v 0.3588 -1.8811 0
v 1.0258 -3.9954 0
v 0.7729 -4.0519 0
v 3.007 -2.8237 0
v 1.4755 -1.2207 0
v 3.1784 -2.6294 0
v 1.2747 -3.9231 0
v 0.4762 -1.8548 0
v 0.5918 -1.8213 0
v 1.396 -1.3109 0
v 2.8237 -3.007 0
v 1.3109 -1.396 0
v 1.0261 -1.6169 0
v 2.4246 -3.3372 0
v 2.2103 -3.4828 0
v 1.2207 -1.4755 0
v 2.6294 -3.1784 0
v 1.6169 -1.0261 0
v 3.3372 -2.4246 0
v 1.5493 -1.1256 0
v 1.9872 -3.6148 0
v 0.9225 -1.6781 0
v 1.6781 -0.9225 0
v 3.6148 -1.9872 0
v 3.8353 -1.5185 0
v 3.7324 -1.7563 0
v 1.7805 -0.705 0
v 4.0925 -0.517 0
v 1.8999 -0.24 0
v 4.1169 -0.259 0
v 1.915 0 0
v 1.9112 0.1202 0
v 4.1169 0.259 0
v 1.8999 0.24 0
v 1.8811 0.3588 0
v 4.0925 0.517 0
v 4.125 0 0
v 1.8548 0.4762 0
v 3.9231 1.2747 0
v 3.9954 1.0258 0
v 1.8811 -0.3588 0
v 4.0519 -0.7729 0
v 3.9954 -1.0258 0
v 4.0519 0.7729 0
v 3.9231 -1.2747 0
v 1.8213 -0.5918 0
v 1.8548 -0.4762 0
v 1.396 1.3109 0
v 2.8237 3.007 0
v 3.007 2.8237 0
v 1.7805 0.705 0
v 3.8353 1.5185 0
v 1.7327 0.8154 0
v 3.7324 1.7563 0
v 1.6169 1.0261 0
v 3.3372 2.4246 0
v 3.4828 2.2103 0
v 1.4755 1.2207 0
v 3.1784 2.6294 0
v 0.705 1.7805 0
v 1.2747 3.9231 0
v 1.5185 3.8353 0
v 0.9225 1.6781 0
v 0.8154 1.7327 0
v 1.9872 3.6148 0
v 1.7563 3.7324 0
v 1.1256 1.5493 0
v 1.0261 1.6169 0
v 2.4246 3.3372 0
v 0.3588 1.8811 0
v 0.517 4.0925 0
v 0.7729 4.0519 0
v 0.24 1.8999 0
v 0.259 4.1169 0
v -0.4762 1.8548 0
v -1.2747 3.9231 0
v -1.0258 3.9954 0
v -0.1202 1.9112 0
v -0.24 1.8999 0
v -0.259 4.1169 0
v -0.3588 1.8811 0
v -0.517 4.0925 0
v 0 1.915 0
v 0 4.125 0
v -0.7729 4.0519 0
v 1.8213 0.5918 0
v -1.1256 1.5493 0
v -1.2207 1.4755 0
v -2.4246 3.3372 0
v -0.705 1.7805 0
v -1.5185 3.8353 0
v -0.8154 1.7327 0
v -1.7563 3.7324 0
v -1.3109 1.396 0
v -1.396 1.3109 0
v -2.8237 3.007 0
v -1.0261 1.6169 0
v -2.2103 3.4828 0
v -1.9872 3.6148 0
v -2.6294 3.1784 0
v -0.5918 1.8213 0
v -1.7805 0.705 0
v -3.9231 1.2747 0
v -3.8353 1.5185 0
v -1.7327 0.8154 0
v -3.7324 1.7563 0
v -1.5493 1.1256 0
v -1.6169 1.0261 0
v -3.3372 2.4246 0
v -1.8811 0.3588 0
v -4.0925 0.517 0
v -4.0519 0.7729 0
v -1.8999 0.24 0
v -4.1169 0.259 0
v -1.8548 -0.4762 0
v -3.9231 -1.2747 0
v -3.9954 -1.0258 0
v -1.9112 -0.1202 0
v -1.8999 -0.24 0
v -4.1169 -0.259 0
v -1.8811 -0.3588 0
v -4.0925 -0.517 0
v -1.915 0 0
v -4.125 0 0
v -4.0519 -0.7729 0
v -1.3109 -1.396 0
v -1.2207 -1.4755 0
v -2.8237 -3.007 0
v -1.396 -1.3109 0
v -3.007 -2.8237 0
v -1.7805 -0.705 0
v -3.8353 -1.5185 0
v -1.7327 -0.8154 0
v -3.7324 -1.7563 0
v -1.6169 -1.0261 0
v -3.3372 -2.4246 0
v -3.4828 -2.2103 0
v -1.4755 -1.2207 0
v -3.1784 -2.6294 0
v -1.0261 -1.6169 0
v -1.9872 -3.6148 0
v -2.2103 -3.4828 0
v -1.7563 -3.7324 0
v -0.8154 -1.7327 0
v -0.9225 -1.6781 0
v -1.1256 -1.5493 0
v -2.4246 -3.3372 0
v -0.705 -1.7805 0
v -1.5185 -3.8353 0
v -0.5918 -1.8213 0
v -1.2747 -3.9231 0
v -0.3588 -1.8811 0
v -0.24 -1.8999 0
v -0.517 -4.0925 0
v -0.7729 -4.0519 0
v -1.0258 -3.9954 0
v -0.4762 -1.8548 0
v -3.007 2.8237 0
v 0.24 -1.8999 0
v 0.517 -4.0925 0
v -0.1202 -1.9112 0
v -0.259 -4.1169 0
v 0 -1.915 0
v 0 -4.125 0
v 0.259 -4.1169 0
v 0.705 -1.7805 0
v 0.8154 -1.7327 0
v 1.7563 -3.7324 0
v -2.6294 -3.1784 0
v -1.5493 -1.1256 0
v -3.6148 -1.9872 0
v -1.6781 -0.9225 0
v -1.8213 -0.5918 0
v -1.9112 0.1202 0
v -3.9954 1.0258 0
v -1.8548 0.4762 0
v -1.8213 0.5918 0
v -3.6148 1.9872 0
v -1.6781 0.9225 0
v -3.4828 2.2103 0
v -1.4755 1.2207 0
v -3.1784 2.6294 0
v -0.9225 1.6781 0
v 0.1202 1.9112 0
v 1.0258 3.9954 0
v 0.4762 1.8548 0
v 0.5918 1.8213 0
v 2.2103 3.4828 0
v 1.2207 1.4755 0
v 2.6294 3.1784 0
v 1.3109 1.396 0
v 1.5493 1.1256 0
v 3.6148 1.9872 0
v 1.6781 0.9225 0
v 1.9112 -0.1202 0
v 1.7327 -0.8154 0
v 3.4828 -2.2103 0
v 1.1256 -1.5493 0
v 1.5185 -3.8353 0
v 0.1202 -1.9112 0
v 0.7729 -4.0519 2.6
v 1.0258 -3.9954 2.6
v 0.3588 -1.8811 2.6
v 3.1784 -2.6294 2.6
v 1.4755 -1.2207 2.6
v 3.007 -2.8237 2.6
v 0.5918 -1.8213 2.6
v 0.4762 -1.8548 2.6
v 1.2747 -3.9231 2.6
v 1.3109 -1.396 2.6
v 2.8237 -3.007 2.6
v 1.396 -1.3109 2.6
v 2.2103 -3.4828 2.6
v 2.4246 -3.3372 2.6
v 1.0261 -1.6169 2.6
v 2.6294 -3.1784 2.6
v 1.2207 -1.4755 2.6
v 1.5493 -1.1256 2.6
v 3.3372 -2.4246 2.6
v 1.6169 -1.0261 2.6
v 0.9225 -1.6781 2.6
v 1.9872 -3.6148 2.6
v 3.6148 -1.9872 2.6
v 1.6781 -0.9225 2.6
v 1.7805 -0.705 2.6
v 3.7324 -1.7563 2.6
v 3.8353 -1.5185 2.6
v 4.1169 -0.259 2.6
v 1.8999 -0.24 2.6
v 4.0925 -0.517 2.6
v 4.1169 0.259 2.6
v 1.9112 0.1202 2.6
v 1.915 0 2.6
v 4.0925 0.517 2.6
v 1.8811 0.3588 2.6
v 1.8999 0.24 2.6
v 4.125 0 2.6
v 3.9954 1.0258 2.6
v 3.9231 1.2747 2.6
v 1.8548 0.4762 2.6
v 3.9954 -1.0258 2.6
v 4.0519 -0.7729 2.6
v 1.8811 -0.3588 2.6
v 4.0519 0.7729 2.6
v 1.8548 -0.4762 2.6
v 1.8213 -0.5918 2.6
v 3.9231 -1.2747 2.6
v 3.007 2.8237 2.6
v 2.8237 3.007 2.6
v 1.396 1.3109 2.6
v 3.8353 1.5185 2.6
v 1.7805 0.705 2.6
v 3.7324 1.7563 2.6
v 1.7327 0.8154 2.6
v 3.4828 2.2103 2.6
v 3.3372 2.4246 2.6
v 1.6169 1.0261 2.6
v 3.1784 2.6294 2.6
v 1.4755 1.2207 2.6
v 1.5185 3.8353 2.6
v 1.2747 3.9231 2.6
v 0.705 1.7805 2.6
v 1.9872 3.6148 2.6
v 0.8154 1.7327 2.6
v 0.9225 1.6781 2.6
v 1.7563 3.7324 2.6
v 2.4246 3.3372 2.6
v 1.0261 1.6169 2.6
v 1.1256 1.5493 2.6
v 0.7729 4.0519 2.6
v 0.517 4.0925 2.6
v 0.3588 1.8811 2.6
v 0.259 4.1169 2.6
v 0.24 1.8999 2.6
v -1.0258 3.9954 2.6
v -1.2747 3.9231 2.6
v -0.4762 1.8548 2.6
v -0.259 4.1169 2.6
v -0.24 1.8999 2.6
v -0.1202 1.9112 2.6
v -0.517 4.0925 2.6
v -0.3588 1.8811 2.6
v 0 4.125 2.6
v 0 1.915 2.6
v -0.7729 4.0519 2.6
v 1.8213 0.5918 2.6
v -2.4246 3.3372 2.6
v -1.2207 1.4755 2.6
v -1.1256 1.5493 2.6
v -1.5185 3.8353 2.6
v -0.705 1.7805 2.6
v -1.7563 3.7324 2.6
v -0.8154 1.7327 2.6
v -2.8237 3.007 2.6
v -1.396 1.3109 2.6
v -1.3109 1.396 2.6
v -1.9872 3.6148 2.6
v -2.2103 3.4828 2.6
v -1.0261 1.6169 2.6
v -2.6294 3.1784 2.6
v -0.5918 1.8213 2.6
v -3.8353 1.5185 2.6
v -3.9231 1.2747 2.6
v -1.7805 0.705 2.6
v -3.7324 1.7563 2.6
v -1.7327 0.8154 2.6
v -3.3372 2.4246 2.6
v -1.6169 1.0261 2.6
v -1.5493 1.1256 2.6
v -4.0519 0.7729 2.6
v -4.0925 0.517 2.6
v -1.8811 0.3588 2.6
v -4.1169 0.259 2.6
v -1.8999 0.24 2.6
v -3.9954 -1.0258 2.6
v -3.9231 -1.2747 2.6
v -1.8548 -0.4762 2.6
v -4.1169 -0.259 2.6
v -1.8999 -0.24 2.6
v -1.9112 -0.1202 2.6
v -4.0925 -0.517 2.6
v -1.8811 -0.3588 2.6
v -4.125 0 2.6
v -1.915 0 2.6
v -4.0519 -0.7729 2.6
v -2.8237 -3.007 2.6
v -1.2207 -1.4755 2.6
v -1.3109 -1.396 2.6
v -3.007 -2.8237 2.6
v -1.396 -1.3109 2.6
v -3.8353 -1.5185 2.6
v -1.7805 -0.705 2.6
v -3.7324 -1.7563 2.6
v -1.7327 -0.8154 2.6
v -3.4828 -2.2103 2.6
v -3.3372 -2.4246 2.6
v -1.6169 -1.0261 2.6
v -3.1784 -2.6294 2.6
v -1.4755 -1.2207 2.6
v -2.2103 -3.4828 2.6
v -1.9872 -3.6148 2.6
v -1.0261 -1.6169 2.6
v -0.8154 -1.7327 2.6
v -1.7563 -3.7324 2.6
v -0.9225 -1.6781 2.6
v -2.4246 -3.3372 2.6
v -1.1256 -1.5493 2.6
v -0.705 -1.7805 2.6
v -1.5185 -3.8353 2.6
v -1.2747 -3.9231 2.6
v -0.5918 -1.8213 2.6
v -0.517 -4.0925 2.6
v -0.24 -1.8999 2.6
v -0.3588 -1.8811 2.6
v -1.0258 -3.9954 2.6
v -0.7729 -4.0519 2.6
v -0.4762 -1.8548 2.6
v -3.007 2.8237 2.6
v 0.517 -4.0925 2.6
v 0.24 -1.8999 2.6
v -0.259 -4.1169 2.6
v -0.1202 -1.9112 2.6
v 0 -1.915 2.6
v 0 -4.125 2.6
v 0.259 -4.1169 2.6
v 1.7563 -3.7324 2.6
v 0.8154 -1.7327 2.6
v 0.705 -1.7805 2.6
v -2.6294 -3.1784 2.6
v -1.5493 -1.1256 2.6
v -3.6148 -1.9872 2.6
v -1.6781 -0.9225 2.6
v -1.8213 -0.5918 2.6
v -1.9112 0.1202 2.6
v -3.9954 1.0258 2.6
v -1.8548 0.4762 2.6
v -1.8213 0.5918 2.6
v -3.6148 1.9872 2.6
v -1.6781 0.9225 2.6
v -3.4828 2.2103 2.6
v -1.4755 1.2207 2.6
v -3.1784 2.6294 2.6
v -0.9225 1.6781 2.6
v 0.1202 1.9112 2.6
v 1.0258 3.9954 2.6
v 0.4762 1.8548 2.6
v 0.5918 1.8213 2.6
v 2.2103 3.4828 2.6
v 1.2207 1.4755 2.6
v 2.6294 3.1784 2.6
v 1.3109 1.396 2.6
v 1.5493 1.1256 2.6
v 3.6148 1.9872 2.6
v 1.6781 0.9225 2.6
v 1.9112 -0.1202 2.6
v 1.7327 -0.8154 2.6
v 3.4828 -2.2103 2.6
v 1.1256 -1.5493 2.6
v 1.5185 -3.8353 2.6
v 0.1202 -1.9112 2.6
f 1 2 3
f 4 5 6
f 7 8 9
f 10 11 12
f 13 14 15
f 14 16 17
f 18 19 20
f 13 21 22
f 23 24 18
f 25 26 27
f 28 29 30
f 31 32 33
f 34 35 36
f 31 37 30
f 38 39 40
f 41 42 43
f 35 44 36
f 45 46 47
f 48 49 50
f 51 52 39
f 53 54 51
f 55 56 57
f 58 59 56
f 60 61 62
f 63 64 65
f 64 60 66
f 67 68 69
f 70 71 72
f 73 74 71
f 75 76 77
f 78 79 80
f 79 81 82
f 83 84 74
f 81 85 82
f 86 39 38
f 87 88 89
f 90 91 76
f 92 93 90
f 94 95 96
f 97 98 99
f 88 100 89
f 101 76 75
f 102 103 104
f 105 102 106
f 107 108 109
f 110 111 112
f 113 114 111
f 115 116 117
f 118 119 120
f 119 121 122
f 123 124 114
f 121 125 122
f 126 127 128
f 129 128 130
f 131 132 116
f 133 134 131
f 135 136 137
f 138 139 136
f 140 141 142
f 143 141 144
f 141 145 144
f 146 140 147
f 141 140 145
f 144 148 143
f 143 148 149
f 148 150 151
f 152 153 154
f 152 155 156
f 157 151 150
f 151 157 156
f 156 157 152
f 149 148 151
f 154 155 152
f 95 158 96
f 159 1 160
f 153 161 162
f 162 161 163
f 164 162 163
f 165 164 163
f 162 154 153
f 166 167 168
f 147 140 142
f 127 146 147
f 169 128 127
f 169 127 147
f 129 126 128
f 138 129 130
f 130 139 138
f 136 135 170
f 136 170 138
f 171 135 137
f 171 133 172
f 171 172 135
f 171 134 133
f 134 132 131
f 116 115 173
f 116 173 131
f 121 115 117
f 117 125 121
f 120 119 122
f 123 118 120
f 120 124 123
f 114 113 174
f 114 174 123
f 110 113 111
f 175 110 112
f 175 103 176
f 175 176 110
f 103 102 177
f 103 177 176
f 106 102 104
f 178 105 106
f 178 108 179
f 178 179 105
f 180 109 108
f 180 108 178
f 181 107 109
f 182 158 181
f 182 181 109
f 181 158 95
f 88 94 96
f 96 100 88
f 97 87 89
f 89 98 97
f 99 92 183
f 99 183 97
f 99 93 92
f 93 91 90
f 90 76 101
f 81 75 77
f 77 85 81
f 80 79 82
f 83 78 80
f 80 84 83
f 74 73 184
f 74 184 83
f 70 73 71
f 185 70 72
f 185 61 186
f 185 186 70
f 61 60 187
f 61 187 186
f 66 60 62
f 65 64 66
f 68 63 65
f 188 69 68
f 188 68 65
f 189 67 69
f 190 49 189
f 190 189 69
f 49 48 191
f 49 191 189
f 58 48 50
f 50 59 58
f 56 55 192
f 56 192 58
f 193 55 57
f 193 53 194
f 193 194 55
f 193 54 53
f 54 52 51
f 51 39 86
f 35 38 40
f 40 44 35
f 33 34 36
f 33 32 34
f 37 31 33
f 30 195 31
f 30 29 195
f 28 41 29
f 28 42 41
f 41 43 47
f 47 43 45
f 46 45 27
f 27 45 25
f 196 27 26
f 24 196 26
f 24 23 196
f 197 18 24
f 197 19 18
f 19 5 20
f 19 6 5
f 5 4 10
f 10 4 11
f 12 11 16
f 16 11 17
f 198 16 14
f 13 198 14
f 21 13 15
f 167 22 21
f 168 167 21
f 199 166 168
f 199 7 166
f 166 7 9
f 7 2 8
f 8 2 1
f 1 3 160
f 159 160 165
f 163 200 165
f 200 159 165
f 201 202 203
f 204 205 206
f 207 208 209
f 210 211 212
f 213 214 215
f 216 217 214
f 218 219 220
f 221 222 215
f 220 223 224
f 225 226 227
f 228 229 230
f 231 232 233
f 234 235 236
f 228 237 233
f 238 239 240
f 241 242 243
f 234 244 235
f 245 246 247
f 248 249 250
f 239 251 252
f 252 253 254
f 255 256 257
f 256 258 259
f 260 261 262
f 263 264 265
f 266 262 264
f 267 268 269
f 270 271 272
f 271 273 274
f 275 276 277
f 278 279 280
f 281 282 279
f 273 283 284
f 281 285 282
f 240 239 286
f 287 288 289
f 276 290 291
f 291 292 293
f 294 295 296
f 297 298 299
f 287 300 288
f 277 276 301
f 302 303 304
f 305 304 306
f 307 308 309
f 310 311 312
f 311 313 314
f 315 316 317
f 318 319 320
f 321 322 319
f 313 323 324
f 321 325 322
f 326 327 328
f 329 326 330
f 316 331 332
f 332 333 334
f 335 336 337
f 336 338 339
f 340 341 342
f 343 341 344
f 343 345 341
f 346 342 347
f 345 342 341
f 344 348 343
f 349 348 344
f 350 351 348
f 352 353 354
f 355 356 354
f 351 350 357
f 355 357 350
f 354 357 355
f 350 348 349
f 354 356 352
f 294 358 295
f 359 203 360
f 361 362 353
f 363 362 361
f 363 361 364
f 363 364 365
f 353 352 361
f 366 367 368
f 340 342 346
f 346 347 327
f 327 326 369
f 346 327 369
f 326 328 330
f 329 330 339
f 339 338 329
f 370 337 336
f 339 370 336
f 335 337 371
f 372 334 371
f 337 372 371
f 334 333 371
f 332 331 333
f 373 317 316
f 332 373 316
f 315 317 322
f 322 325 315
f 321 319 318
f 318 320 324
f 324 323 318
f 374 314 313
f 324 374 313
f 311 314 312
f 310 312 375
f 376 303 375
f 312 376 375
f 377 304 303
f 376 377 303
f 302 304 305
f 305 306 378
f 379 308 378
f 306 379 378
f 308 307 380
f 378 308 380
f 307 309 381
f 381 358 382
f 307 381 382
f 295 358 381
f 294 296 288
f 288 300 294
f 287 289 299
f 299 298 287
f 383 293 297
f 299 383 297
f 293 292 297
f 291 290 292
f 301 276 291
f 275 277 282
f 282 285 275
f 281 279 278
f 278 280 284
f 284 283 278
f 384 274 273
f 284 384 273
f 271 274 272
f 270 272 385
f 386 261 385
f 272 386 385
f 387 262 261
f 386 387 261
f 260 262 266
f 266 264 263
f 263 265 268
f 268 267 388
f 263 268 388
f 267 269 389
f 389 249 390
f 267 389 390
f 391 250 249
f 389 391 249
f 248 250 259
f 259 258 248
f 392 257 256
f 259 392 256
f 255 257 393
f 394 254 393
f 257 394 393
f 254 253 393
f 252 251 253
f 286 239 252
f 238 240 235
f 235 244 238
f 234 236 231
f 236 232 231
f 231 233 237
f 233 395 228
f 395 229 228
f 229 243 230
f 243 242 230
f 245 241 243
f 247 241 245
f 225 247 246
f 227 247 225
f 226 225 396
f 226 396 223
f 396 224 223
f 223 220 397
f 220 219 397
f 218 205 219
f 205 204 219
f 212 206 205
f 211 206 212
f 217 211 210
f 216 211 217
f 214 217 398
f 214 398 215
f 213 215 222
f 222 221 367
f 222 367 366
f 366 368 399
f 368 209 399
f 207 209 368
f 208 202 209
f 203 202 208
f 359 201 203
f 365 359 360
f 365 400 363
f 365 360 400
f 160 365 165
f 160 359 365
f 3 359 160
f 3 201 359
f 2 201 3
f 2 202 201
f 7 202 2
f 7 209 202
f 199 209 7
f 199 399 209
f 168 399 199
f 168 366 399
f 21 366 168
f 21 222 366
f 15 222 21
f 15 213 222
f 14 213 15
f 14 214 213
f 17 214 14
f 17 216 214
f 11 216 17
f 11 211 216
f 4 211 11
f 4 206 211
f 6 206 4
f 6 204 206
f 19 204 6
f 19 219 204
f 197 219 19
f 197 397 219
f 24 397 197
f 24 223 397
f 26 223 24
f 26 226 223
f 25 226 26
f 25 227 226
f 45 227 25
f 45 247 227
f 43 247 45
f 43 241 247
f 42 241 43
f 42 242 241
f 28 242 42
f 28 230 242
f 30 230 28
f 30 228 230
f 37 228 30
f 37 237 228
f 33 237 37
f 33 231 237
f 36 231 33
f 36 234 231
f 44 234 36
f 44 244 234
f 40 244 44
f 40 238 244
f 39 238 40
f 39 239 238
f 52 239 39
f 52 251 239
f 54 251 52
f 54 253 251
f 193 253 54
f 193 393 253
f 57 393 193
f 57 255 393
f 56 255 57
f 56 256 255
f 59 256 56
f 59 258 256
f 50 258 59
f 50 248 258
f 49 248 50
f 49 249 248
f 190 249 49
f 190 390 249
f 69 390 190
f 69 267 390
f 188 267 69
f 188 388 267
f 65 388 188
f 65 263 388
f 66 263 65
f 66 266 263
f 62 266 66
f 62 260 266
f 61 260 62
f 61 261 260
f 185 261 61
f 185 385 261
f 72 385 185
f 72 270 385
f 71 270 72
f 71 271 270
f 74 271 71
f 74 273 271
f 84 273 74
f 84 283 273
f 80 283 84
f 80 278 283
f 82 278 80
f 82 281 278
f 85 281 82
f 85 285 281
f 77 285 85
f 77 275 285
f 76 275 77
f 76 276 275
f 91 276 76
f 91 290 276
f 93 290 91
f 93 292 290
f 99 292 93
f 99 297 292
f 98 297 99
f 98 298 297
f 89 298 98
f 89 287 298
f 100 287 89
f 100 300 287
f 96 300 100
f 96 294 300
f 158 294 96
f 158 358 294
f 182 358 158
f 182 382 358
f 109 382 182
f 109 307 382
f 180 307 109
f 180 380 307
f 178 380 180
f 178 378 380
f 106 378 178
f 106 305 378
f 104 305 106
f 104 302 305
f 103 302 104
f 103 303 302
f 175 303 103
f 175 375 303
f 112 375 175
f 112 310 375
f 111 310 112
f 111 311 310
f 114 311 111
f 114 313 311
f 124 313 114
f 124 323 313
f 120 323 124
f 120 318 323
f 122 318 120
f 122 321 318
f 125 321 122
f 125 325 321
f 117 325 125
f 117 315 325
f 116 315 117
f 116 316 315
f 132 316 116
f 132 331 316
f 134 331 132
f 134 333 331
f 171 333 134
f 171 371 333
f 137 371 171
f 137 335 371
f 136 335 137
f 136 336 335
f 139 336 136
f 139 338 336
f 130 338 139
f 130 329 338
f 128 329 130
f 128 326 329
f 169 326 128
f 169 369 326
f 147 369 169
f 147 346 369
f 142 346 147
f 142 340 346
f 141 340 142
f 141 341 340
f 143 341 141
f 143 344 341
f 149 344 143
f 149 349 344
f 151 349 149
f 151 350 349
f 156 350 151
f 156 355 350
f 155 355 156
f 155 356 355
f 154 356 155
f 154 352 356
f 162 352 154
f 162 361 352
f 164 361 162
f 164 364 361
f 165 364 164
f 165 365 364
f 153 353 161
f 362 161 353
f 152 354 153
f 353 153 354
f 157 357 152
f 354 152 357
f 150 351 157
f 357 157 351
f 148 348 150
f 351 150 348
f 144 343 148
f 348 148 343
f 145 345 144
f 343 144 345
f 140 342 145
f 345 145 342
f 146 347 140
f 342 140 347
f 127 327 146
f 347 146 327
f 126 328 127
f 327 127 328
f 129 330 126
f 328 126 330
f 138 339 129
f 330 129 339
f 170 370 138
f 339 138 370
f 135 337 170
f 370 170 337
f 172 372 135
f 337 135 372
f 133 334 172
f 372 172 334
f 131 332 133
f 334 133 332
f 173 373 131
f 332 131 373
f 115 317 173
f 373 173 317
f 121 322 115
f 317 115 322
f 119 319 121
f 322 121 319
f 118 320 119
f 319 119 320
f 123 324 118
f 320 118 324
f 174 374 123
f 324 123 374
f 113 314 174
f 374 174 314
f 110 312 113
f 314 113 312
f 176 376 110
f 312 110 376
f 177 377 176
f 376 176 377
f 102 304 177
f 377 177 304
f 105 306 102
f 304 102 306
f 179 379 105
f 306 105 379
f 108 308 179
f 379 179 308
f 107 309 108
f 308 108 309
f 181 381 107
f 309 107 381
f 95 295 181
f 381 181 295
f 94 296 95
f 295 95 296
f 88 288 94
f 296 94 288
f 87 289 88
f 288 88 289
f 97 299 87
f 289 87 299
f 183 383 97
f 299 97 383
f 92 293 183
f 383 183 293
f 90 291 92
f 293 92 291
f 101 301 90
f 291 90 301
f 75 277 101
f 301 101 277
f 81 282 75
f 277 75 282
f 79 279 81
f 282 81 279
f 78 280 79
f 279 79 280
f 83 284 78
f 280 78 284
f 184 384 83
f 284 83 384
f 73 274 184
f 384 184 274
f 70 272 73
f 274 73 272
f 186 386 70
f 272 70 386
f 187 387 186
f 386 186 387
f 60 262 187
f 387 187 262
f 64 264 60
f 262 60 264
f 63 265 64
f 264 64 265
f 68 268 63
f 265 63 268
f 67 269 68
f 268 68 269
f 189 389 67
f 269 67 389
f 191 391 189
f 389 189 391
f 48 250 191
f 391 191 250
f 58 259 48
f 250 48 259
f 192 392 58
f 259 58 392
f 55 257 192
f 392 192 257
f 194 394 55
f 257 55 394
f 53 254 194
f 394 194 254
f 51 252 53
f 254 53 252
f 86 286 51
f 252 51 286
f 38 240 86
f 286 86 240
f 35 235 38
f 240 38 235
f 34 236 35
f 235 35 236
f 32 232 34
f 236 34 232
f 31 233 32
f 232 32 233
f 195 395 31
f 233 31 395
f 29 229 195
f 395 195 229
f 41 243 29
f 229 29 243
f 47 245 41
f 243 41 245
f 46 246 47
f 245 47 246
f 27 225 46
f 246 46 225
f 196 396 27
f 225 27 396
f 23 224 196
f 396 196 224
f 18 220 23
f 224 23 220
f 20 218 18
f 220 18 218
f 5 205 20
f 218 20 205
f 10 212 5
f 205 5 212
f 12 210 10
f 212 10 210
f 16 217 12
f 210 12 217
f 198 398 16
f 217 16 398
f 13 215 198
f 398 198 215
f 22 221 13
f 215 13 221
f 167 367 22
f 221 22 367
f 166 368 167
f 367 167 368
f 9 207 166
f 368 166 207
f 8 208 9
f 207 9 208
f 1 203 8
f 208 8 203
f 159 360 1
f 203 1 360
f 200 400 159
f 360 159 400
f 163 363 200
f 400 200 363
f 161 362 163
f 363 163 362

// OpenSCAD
$fn = 100;

outerd = 8.25;
inner = 3.83;
tall = 2.6;

linear_extrude(height = tall) difference()
{
    circle(outerd / 2);
    circle(inner / 2);
}
